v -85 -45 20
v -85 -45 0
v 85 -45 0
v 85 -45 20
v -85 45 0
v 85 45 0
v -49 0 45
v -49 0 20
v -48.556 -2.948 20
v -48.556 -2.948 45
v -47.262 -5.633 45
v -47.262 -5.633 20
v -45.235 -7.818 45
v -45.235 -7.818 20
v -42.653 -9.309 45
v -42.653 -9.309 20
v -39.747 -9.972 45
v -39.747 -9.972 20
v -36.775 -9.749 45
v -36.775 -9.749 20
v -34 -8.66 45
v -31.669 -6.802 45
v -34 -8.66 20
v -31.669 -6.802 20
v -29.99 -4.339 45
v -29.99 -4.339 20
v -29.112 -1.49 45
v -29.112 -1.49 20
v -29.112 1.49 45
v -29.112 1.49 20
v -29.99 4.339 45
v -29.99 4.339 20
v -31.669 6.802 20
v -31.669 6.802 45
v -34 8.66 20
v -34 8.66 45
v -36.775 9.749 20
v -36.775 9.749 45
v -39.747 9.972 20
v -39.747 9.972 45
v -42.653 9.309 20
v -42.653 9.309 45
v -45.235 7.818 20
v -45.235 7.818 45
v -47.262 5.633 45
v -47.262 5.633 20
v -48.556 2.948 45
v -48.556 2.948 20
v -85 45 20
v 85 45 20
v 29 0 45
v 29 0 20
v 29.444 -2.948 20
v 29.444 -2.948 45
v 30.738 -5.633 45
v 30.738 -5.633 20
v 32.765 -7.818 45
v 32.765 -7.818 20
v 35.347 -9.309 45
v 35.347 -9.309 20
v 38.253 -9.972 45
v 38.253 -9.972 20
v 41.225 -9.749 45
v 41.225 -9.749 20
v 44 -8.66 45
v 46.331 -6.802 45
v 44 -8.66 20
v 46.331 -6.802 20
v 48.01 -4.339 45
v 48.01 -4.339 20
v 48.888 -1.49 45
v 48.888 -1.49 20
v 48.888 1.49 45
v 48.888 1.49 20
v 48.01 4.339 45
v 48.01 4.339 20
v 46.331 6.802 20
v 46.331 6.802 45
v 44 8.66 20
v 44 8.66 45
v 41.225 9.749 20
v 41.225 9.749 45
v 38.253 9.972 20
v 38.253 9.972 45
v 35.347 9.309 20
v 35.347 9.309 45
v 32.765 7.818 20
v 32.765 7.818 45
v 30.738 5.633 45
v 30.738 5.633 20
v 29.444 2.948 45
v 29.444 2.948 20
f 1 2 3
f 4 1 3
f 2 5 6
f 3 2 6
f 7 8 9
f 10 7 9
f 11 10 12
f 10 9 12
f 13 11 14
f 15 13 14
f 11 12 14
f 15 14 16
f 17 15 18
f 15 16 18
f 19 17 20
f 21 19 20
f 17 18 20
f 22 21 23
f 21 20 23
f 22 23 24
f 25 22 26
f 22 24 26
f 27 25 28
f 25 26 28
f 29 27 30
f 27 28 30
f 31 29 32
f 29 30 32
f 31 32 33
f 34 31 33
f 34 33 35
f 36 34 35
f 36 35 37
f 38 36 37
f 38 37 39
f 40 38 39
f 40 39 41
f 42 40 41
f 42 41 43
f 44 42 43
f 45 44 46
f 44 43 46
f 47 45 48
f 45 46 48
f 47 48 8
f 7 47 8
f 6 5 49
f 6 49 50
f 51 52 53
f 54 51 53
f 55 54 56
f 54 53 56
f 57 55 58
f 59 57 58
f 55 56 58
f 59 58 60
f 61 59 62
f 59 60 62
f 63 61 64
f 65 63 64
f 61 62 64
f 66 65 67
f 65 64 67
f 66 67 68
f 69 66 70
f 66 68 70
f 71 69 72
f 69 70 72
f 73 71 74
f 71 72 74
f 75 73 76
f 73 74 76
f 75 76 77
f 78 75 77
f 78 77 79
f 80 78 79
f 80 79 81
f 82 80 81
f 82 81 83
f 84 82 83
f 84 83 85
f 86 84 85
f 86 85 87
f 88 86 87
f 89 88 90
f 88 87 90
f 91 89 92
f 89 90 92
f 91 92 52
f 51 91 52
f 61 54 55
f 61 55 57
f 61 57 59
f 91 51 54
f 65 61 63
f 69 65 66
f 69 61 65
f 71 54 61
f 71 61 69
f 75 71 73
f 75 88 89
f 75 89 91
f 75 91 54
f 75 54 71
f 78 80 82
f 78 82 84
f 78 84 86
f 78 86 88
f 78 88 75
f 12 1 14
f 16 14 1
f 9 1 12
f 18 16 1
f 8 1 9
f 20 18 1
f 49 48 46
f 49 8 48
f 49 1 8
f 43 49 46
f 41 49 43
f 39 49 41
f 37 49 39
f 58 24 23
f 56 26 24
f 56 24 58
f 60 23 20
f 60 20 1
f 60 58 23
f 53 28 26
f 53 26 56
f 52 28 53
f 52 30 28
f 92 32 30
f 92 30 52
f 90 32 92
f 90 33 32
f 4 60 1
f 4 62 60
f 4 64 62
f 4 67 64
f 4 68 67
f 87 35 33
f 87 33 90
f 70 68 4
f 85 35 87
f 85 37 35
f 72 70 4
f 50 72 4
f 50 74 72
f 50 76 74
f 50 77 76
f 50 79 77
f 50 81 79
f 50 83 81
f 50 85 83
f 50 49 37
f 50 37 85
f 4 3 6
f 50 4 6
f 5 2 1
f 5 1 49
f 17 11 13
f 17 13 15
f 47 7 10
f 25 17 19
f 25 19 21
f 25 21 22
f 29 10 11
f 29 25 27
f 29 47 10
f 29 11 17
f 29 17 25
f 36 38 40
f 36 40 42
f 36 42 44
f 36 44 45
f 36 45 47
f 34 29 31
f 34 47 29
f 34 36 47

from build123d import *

# Parameters (mm, degrees)
F0_W     = 170
F0_H     = 90
F1_DEPTH = 20
F3_DEPTH = 25


with BuildPart() as f1:
    # F0 (on Top) → F1 (new body)
    with BuildSketch(Plane.XY):
        Rectangle(F0_W, F0_H)
    extrude(amount=F1_DEPTH)

    # F2 (on face) → F3 (join)
    with BuildSketch(Plane.XY.offset(20)):
        with BuildLine():
            Line((-49, 0), (-39, 0))
            Line((-39, 0), (-29, 0))
            ThreePointArc((-29, 0), (-39, 10), (-49, 0))
        make_face()
        with BuildLine():
            Line((-29, 0), (-39, 0))
            Line((-39, 0), (-49, 0))
            ThreePointArc((-49, 0), (-39, -10), (-29, 0))
        make_face()
        with BuildLine():
            ThreePointArc((49, 0), (39, 10), (29, 0))
            Line((29, 0), (39, 0))
            Line((39, 0), (49, 0))
        make_face()
        with BuildLine():
            Line((39, 0), (29, 0))
            ThreePointArc((29, 0), (39, -10), (49, 0))
            Line((49, 0), (39, 0))
        make_face()
    extrude(amount=F3_DEPTH)


solid = f1.part
